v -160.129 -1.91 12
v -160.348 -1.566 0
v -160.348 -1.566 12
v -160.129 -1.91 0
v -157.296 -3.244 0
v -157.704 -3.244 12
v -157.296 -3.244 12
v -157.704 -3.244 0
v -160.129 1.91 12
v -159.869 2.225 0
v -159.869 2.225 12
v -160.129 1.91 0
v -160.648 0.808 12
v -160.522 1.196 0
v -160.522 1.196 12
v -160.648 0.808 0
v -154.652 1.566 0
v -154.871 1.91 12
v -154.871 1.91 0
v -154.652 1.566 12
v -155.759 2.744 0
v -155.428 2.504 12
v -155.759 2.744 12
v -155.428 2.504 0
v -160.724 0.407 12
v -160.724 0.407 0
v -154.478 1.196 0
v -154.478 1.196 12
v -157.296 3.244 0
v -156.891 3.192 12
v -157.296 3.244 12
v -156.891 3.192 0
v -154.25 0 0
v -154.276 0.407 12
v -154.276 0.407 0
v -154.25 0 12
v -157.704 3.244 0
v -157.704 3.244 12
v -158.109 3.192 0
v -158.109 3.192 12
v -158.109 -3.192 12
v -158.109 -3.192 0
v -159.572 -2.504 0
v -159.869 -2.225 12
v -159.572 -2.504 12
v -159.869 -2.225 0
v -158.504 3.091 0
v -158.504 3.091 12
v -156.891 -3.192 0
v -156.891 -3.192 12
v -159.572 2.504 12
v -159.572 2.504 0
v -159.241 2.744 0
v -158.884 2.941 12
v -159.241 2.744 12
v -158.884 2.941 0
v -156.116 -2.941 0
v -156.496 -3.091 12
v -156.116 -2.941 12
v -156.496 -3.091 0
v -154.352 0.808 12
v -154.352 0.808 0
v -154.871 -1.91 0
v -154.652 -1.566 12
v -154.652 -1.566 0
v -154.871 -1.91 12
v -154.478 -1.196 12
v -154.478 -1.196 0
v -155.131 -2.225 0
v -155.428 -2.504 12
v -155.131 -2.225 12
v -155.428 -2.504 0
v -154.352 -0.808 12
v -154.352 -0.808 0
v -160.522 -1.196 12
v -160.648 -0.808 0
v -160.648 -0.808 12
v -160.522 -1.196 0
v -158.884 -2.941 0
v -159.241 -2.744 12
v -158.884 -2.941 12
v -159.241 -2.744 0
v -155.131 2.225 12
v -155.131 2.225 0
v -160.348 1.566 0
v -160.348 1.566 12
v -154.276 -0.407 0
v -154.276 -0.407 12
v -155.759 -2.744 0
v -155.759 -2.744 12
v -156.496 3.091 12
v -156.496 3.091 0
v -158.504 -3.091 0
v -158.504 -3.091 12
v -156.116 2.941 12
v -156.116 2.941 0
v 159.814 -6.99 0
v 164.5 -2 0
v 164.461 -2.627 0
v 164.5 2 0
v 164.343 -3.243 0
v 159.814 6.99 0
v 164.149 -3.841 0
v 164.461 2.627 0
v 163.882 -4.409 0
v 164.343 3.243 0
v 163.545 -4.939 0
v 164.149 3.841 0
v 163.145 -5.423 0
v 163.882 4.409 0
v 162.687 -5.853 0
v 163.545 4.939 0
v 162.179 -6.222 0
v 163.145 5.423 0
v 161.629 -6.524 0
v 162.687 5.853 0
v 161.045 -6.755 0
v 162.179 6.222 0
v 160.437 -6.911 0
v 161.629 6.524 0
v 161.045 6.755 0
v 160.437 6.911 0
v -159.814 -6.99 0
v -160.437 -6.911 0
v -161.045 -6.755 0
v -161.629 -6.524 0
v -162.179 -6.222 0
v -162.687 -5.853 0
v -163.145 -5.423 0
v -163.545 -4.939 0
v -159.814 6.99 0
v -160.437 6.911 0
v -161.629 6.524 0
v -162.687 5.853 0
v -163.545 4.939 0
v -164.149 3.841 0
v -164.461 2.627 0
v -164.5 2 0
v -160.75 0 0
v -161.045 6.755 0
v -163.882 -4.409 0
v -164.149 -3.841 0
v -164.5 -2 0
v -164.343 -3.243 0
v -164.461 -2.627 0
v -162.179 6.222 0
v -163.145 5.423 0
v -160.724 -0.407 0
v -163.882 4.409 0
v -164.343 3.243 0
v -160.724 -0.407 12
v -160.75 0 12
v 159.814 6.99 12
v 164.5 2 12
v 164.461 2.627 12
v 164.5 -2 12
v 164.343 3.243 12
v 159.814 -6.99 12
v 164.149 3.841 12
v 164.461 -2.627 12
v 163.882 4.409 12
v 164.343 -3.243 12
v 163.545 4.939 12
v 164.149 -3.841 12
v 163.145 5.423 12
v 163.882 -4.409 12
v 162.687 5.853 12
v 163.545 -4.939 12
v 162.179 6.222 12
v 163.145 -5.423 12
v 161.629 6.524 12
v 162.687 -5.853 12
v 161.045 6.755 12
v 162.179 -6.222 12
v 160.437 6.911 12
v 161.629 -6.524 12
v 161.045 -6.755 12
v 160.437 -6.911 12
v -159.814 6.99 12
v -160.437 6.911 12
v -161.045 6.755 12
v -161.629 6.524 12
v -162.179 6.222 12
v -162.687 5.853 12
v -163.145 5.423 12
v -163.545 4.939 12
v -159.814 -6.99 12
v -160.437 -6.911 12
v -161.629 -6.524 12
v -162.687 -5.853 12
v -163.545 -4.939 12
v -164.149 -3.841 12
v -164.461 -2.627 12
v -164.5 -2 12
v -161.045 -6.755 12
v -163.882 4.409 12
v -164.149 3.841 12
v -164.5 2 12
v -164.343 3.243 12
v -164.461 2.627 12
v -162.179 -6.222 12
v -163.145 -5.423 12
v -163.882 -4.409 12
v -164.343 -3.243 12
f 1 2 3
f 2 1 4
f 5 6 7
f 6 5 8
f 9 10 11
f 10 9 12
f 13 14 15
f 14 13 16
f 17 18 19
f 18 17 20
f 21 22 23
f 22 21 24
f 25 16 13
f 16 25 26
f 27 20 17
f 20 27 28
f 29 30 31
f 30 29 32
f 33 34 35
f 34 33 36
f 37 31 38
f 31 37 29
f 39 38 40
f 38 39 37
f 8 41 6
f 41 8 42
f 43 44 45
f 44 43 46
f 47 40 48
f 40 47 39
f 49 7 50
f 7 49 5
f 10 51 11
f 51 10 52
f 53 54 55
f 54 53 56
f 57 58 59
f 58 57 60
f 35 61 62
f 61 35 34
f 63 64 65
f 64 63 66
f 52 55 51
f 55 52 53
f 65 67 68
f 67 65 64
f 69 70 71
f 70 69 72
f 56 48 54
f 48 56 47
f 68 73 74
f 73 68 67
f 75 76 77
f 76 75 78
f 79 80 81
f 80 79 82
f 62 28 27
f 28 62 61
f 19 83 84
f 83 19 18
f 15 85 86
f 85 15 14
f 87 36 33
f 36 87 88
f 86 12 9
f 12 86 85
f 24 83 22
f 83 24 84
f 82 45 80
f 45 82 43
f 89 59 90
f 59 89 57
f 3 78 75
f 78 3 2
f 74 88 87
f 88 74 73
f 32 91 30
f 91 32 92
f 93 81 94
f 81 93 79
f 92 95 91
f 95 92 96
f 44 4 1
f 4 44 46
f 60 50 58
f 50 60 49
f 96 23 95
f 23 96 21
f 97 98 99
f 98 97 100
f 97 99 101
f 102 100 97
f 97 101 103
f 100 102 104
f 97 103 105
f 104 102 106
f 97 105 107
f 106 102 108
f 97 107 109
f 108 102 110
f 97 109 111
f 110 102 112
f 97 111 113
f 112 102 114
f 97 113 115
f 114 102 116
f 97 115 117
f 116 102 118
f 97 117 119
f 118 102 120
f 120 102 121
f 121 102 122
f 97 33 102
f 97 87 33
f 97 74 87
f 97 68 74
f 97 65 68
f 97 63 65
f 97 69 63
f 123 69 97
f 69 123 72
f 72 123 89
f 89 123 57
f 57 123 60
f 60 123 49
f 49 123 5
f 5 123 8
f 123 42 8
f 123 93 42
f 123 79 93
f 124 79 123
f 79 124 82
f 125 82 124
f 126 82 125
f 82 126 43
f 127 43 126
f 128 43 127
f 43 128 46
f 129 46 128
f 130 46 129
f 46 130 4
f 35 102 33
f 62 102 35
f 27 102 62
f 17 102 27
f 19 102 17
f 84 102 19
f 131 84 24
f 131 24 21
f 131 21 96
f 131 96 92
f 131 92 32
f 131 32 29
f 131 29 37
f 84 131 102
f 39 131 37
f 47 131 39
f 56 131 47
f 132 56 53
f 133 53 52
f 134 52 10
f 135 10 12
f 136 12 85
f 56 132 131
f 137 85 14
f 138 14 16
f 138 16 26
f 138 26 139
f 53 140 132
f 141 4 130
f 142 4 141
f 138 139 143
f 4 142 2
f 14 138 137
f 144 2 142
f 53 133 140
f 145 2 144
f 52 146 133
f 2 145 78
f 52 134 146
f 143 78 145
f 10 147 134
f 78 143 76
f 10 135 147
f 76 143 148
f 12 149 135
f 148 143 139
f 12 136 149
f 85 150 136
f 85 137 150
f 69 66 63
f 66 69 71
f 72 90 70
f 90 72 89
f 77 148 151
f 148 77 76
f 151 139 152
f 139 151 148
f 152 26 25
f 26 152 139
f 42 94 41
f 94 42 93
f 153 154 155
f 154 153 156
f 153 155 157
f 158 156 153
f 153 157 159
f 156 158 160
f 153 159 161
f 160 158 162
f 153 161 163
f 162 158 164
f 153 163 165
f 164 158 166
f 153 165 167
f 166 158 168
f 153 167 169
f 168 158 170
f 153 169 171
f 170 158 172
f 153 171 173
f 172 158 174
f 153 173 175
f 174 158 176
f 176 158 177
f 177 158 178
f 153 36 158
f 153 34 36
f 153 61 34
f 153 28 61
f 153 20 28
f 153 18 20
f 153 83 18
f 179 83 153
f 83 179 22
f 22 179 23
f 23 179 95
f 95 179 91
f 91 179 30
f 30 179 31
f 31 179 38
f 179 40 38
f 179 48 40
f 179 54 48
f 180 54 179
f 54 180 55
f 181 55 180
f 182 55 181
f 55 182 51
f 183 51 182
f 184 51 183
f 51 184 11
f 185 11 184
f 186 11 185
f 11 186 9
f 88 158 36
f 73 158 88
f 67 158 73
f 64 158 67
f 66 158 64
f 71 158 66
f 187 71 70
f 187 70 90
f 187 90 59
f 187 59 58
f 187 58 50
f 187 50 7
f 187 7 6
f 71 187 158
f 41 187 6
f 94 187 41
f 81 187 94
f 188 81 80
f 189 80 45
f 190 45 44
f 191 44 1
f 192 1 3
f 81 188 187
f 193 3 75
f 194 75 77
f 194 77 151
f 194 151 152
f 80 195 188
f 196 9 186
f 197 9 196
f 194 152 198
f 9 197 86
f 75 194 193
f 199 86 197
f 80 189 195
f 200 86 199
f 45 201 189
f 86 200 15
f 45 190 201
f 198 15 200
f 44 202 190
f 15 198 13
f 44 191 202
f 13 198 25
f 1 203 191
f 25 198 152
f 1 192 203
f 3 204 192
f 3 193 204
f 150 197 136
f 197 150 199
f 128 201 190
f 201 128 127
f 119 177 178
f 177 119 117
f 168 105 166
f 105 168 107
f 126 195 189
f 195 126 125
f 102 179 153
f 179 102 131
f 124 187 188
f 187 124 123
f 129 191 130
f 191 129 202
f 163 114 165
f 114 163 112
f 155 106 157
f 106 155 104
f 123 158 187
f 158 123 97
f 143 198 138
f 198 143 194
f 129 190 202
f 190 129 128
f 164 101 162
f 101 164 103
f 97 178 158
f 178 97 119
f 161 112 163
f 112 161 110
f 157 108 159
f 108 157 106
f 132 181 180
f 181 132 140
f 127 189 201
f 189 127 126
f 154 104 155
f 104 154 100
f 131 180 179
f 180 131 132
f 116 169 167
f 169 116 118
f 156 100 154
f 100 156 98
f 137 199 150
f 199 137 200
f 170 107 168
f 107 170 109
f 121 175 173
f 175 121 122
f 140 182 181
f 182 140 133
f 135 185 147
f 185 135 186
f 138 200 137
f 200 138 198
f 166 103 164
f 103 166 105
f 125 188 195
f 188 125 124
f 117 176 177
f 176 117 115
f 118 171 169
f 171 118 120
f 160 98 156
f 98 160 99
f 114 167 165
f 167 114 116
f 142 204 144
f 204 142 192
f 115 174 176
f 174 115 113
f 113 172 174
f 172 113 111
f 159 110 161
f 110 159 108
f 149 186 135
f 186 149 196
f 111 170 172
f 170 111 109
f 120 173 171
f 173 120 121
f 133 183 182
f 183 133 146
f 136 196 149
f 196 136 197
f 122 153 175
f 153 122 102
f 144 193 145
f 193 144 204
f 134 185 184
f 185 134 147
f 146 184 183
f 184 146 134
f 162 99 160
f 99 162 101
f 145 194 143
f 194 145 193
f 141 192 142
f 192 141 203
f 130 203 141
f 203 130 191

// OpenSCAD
$fn = 50;


difference() {
	union() {
		hull() {
			translate(v = [-159.5000000000, 2.0000000000, 0]) {
				cylinder(h = 12, r = 5);
			}
			translate(v = [159.5000000000, 2.0000000000, 0]) {
				cylinder(h = 12, r = 5);
			}
			translate(v = [-159.5000000000, -2.0000000000, 0]) {
				cylinder(h = 12, r = 5);
			}
			translate(v = [159.5000000000, -2.0000000000, 0]) {
				cylinder(h = 12, r = 5);
			}
		}
	}
	union() {
		translate(v = [-157.5000000000, 0.0000000000, 0]) {
			cylinder(h = 12, r = 3.2500000000);
		}
		translate(v = [-157.5000000000, 0.0000000000, 0]) {
			cylinder(h = 12, r = 1.8000000000);
		}
		translate(v = [-157.5000000000, 0.0000000000, 0]) {
			cylinder(h = 12, r = 1.8000000000);
		}
		translate(v = [-157.5000000000, 0.0000000000, 0]) {
			cylinder(h = 12, r = 1.8000000000);
		}
	}
}
